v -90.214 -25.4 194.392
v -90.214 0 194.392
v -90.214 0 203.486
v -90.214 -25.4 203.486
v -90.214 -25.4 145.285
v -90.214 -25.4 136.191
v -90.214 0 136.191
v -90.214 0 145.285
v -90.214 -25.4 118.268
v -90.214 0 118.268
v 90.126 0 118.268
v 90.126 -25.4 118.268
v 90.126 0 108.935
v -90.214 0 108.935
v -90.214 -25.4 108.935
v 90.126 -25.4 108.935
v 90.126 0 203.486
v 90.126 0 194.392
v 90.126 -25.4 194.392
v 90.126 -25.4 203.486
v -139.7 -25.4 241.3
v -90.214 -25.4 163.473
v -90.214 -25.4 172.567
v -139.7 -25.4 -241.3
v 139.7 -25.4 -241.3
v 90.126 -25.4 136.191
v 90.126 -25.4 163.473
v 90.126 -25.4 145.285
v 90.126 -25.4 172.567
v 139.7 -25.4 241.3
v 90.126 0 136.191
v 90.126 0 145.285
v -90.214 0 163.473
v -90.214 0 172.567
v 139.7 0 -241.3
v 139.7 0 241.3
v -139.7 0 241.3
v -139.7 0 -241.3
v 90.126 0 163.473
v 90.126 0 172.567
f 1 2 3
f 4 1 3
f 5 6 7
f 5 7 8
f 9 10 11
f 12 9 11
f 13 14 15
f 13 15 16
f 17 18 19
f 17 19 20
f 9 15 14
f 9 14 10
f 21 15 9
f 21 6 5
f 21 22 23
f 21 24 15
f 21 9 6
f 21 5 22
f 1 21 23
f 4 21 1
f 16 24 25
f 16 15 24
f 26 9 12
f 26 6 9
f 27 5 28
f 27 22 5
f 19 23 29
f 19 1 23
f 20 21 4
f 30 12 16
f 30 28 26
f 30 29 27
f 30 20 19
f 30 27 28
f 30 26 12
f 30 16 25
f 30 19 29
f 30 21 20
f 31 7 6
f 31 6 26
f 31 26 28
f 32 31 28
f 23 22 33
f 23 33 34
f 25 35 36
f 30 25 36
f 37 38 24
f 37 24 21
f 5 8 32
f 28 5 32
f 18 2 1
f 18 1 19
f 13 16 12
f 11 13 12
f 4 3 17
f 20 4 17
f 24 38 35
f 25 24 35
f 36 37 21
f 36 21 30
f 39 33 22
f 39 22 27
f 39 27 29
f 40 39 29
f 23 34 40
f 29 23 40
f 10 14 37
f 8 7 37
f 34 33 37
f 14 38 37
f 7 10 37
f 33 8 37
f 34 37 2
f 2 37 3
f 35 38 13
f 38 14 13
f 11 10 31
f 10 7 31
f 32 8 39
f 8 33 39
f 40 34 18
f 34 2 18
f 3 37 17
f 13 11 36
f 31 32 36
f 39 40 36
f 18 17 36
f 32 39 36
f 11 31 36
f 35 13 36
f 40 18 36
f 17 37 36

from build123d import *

# Parameters (mm, degrees)
F0_W     = 279.4
F0_H     = 482.6
F0_W_2   = 180.34
F0_H_2   = 9.333409
F0_H_3   = 9.09394
F0_H_4   = 9.093925
F1_DEPTH = 25.4
F2_DEPTH = 25.4


with BuildPart() as f1:
    # F0 (on Front) → F1 (new body)
    with BuildSketch(Plane.XZ):
        Rectangle(F0_W, F0_H)
        with Locations((-0.043589, 113.601674)):
            Rectangle(F0_W_2, F0_H_2, mode=Mode.SUBTRACT)
        with Locations((-0.043589, 140.737757)):
            Rectangle(F0_W_2, F0_H_3, mode=Mode.SUBTRACT)
        with Locations((-0.043589, 168.019548)):
            Rectangle(F0_W_2, F0_H_3, mode=Mode.SUBTRACT)
        with Locations((-0.043589, 198.938913)):
            Rectangle(F0_W_2, F0_H_4, mode=Mode.SUBTRACT)
    extrude(amount=F1_DEPTH)

    # F0 (on Front) → F2 (join)
    with BuildSketch(Plane.XZ):
        Rectangle(F0_W, F0_H)
        with Locations((-0.043589, 113.601674)):
            Rectangle(F0_W_2, F0_H_2, mode=Mode.SUBTRACT)
        with Locations((-0.043589, 140.737757)):
            Rectangle(F0_W_2, F0_H_3, mode=Mode.SUBTRACT)
        with Locations((-0.043589, 168.019548)):
            Rectangle(F0_W_2, F0_H_3, mode=Mode.SUBTRACT)
        with Locations((-0.043589, 198.938913)):
            Rectangle(F0_W_2, F0_H_4, mode=Mode.SUBTRACT)
    extrude(amount=F2_DEPTH)


solid = f1.part
